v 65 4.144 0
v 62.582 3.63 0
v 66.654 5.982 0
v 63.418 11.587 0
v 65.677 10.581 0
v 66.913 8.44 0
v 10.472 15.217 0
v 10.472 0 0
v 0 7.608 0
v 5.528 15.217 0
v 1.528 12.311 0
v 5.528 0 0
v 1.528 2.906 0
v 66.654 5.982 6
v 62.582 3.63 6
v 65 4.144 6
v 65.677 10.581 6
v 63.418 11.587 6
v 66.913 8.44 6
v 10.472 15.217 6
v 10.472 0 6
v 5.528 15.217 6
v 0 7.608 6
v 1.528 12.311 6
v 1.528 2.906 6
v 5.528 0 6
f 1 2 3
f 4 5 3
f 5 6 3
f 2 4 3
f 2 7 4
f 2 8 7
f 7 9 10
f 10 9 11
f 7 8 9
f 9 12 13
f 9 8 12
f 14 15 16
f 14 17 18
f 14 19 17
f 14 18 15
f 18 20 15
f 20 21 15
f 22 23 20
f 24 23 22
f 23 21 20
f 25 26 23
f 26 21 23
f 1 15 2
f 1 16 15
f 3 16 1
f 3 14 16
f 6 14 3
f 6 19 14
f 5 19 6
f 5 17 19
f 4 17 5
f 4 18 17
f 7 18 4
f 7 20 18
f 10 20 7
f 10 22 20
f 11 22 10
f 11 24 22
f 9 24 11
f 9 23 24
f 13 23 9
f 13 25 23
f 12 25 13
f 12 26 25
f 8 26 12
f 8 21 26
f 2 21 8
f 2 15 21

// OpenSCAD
$fn = 32;

// ----------------------------------------------------------------------
// Lever arm: two bosses 16 and 8 mm, 55 mm between centres
// ----------------------------------------------------------------------

// --- parameters (mm) ---
profile_height = 6;       // extrusion height
profile_points = 13;      // points of the closed outline

profile = [[0, 7.608], [1.528, 2.906], [5.528, 0], [10.472, 0], [62.582, 3.63], [65, 4.144], [66.654, 5.982], [66.913, 8.44], [65.677, 10.581], [63.418, 11.587], [10.472, 15.217], [5.528, 15.217], [1.528, 12.311]];  // single closed polygon, 13 points, counter clockwise

// --- the one profile operation ---
linear_extrude(height = profile_height) polygon(points = profile);
